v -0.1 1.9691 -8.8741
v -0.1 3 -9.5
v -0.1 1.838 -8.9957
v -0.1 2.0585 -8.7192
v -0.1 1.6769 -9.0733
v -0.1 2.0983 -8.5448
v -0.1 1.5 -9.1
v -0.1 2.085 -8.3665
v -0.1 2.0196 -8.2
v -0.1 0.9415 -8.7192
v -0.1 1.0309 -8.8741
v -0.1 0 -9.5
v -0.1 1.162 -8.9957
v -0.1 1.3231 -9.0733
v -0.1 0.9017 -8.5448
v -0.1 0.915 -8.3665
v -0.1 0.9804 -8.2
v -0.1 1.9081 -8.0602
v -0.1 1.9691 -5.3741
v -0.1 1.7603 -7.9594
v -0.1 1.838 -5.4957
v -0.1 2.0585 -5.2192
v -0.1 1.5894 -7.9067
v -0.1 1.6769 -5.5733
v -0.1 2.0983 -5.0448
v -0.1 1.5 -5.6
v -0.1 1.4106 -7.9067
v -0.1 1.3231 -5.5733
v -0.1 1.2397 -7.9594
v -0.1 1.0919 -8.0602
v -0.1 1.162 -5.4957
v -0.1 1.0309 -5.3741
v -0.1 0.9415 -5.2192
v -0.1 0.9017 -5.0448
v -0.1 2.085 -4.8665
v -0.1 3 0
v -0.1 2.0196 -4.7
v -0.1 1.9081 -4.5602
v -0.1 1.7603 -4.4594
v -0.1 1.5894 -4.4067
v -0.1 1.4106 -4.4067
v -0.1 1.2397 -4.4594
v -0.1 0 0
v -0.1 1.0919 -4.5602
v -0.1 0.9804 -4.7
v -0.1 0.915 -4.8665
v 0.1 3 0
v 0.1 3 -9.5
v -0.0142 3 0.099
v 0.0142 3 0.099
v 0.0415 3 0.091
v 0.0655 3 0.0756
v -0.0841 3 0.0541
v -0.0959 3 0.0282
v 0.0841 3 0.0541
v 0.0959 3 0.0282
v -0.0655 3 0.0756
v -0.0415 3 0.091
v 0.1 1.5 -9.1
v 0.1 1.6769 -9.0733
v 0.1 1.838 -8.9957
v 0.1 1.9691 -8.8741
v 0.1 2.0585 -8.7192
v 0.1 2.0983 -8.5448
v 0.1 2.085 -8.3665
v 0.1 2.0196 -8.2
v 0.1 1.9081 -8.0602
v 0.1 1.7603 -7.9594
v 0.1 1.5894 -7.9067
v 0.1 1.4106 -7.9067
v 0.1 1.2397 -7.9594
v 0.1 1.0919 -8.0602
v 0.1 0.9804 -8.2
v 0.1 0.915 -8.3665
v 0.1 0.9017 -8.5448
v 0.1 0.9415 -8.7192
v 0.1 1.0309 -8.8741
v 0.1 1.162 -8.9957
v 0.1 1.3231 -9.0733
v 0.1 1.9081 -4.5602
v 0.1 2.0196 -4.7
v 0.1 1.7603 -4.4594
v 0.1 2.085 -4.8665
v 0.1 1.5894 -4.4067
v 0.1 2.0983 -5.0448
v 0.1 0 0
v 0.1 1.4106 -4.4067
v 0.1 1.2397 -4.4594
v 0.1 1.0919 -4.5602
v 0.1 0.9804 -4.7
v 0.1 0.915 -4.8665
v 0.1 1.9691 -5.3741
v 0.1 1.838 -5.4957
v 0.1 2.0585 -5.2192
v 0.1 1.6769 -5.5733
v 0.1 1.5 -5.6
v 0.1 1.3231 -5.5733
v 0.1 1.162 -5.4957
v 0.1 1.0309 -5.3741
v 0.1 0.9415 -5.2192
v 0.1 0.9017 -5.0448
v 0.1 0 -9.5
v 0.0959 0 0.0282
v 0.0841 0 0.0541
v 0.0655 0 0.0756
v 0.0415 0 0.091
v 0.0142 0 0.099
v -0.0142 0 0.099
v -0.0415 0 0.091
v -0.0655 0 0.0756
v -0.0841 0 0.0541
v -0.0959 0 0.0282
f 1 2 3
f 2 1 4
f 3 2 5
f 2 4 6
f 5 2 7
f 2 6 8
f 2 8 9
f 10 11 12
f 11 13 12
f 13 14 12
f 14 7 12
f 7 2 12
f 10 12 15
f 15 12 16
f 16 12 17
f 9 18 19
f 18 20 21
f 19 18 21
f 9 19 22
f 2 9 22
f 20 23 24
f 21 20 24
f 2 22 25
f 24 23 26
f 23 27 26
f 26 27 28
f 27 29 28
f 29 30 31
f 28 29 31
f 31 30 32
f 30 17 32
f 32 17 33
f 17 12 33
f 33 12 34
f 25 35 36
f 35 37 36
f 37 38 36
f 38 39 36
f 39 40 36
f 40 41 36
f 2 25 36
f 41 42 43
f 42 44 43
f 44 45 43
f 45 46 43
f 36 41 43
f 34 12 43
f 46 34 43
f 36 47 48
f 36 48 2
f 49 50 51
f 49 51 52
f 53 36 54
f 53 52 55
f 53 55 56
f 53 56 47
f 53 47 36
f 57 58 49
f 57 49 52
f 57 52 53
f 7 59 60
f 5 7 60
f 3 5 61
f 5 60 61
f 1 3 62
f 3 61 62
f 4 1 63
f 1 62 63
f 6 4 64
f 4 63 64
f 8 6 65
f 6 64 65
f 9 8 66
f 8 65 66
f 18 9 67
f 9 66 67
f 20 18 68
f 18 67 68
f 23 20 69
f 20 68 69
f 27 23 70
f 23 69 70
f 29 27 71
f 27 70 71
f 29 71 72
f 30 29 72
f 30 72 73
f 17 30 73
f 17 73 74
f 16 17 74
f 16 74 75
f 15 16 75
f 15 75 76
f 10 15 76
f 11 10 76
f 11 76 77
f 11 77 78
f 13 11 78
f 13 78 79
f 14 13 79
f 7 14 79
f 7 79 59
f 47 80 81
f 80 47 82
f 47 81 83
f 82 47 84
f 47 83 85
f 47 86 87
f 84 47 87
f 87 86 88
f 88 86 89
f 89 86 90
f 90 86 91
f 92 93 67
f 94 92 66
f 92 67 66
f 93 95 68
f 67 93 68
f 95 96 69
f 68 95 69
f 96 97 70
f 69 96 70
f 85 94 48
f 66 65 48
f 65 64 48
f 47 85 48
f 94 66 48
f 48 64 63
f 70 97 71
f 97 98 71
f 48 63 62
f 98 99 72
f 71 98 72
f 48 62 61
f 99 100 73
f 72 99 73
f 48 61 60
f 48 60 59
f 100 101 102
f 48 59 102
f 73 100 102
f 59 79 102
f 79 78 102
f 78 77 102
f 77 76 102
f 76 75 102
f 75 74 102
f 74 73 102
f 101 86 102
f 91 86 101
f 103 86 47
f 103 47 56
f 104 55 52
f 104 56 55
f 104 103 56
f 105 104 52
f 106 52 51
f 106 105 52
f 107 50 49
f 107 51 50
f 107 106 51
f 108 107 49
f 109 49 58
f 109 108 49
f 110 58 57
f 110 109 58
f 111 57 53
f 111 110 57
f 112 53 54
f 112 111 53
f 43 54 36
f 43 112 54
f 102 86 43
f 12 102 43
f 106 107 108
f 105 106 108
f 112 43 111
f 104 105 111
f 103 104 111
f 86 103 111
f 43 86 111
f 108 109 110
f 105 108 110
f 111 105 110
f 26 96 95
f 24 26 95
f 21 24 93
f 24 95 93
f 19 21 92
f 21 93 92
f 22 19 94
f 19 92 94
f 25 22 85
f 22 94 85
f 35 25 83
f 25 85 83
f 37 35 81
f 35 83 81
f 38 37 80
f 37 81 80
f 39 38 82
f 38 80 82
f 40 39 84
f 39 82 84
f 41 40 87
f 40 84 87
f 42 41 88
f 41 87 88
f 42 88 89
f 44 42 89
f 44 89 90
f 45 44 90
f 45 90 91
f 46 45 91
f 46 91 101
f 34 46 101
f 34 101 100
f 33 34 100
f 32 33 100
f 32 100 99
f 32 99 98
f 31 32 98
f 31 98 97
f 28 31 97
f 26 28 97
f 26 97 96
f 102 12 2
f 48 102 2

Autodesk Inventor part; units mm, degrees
ref_plane "YZ Plane" through (0, 0, 0) normal (1, 0, 0) x (0, 1, 0)
ref_plane "XZ Plane" through (0, 0, 0) normal (0, 1, 0) x (-1, 0, 0)
ref_plane "XY Plane" through (0, 0, 0) normal (0, 0, 1) x (1, 0, 0)
sketch "Sketch1" plane through (0, 0, 0) normal (0, 1, 0) x (-1, 0, 0)
  line L0 (0, 0) -> (0, -12) construction
  line L1 (-0.1, 0) -> (-0.1, -12)
  line L2 (0.1, -12) -> (0.1, 0)
  arc A0 (0.1, 0) -> (-0.1, 0) centre (0, 0) ccw
  arc A1 (-0.1, -12) -> (0.1, -12) centre (0, -12) ccw
  point P0 (0, -6)
  dimension "d0" = 12
  dimension "d1" = 0.2
extrude "Extrusion1" add sketch "Sketch1" along normal blind 3
sketch "Sketch2" plane through (0.1, 0, 0) normal (1, 0, 0) x (0, 0, -1)
  line L0 (12.1, 0) -> (12.1, 3) projected
  line L1 (12.1, 1.5) -> (10.1, 1.5)
  circle A0 centre (10.1, 1.5) radius 0.6
  point P0 (0, 0)
  dimension "d4" = 2
  dimension "d5" = 1.2
extrude "Extrusion2" cut sketch "Sketch2" against normal blind 3
sketch "Sketch3" plane through (0.1, 0, 0) normal (1, 0, 0) x (0, 0, -1)
  line L0 (0, 0) -> (0, 3) projected
  line L1 (0, 1.5) -> (5, 1.5)
  line L2 (5, 1.5) -> (8.5, 1.5)
  circle A0 centre (5, 1.5) radius 0.6
  circle A1 centre (8.5, 1.5) radius 0.6
  dimension "d8" = 5
  dimension "d9" = 3.5
  dimension "d10" = 1.2
  dimension "d11" = 1.2
extrude "Extrusion3" cut sketch "Sketch3" against normal blind 10
sketch "Sketch4" plane through (-0.1, 0, -12) normal (-1, 0, 0) x (0, 0, 1)
  circle A0 centre (3.5, 1.5) radius 0.6 projected
  circle A1 centre (7, 1.5) radius 0.6 projected
  circle A2 centre (1.9, 1.5) radius 0.6 projected
  line L0 (0, 0) -> (12, 0) projected
  line L1 (12, 0) -> (12, 3) projected
  line L2 (0, 3) -> (12, 3) projected
  line L3 (0, 0) -> (0, 3) projected
  line L4 (0, 0) -> (0, 3) projected
  line L5 (0, 3) -> (12, 3) projected
  line L6 (0, 0) -> (2.5, 0)
  line L7 (2.5, 0) -> (2.5, 3)
  line L8 (2.5, 3) -> (0, 3)
  line L9 (0, 3) -> (0, 0)
  line L10 (0, 0) -> (-0.8, 0)
  line L11 (-0.8, 0) -> (-0.8, 3)
  line L12 (-0.8, 3) -> (0, 3)
  line L13 (0, 3) -> (0, 0)
  point P0 (2.5, 1.5)
  point P1 (2.5, 3)
  dimension "d14" = 2.5
  dimension "d15" = 0.8
  dimension "d16" = 3
extrude "Extrusion4" cut sketch "Sketch4" against normal blind 10 contours L7 L0 L3 L2 | L10 L11 L12 L3
properties part number "fin_12mm_h"
